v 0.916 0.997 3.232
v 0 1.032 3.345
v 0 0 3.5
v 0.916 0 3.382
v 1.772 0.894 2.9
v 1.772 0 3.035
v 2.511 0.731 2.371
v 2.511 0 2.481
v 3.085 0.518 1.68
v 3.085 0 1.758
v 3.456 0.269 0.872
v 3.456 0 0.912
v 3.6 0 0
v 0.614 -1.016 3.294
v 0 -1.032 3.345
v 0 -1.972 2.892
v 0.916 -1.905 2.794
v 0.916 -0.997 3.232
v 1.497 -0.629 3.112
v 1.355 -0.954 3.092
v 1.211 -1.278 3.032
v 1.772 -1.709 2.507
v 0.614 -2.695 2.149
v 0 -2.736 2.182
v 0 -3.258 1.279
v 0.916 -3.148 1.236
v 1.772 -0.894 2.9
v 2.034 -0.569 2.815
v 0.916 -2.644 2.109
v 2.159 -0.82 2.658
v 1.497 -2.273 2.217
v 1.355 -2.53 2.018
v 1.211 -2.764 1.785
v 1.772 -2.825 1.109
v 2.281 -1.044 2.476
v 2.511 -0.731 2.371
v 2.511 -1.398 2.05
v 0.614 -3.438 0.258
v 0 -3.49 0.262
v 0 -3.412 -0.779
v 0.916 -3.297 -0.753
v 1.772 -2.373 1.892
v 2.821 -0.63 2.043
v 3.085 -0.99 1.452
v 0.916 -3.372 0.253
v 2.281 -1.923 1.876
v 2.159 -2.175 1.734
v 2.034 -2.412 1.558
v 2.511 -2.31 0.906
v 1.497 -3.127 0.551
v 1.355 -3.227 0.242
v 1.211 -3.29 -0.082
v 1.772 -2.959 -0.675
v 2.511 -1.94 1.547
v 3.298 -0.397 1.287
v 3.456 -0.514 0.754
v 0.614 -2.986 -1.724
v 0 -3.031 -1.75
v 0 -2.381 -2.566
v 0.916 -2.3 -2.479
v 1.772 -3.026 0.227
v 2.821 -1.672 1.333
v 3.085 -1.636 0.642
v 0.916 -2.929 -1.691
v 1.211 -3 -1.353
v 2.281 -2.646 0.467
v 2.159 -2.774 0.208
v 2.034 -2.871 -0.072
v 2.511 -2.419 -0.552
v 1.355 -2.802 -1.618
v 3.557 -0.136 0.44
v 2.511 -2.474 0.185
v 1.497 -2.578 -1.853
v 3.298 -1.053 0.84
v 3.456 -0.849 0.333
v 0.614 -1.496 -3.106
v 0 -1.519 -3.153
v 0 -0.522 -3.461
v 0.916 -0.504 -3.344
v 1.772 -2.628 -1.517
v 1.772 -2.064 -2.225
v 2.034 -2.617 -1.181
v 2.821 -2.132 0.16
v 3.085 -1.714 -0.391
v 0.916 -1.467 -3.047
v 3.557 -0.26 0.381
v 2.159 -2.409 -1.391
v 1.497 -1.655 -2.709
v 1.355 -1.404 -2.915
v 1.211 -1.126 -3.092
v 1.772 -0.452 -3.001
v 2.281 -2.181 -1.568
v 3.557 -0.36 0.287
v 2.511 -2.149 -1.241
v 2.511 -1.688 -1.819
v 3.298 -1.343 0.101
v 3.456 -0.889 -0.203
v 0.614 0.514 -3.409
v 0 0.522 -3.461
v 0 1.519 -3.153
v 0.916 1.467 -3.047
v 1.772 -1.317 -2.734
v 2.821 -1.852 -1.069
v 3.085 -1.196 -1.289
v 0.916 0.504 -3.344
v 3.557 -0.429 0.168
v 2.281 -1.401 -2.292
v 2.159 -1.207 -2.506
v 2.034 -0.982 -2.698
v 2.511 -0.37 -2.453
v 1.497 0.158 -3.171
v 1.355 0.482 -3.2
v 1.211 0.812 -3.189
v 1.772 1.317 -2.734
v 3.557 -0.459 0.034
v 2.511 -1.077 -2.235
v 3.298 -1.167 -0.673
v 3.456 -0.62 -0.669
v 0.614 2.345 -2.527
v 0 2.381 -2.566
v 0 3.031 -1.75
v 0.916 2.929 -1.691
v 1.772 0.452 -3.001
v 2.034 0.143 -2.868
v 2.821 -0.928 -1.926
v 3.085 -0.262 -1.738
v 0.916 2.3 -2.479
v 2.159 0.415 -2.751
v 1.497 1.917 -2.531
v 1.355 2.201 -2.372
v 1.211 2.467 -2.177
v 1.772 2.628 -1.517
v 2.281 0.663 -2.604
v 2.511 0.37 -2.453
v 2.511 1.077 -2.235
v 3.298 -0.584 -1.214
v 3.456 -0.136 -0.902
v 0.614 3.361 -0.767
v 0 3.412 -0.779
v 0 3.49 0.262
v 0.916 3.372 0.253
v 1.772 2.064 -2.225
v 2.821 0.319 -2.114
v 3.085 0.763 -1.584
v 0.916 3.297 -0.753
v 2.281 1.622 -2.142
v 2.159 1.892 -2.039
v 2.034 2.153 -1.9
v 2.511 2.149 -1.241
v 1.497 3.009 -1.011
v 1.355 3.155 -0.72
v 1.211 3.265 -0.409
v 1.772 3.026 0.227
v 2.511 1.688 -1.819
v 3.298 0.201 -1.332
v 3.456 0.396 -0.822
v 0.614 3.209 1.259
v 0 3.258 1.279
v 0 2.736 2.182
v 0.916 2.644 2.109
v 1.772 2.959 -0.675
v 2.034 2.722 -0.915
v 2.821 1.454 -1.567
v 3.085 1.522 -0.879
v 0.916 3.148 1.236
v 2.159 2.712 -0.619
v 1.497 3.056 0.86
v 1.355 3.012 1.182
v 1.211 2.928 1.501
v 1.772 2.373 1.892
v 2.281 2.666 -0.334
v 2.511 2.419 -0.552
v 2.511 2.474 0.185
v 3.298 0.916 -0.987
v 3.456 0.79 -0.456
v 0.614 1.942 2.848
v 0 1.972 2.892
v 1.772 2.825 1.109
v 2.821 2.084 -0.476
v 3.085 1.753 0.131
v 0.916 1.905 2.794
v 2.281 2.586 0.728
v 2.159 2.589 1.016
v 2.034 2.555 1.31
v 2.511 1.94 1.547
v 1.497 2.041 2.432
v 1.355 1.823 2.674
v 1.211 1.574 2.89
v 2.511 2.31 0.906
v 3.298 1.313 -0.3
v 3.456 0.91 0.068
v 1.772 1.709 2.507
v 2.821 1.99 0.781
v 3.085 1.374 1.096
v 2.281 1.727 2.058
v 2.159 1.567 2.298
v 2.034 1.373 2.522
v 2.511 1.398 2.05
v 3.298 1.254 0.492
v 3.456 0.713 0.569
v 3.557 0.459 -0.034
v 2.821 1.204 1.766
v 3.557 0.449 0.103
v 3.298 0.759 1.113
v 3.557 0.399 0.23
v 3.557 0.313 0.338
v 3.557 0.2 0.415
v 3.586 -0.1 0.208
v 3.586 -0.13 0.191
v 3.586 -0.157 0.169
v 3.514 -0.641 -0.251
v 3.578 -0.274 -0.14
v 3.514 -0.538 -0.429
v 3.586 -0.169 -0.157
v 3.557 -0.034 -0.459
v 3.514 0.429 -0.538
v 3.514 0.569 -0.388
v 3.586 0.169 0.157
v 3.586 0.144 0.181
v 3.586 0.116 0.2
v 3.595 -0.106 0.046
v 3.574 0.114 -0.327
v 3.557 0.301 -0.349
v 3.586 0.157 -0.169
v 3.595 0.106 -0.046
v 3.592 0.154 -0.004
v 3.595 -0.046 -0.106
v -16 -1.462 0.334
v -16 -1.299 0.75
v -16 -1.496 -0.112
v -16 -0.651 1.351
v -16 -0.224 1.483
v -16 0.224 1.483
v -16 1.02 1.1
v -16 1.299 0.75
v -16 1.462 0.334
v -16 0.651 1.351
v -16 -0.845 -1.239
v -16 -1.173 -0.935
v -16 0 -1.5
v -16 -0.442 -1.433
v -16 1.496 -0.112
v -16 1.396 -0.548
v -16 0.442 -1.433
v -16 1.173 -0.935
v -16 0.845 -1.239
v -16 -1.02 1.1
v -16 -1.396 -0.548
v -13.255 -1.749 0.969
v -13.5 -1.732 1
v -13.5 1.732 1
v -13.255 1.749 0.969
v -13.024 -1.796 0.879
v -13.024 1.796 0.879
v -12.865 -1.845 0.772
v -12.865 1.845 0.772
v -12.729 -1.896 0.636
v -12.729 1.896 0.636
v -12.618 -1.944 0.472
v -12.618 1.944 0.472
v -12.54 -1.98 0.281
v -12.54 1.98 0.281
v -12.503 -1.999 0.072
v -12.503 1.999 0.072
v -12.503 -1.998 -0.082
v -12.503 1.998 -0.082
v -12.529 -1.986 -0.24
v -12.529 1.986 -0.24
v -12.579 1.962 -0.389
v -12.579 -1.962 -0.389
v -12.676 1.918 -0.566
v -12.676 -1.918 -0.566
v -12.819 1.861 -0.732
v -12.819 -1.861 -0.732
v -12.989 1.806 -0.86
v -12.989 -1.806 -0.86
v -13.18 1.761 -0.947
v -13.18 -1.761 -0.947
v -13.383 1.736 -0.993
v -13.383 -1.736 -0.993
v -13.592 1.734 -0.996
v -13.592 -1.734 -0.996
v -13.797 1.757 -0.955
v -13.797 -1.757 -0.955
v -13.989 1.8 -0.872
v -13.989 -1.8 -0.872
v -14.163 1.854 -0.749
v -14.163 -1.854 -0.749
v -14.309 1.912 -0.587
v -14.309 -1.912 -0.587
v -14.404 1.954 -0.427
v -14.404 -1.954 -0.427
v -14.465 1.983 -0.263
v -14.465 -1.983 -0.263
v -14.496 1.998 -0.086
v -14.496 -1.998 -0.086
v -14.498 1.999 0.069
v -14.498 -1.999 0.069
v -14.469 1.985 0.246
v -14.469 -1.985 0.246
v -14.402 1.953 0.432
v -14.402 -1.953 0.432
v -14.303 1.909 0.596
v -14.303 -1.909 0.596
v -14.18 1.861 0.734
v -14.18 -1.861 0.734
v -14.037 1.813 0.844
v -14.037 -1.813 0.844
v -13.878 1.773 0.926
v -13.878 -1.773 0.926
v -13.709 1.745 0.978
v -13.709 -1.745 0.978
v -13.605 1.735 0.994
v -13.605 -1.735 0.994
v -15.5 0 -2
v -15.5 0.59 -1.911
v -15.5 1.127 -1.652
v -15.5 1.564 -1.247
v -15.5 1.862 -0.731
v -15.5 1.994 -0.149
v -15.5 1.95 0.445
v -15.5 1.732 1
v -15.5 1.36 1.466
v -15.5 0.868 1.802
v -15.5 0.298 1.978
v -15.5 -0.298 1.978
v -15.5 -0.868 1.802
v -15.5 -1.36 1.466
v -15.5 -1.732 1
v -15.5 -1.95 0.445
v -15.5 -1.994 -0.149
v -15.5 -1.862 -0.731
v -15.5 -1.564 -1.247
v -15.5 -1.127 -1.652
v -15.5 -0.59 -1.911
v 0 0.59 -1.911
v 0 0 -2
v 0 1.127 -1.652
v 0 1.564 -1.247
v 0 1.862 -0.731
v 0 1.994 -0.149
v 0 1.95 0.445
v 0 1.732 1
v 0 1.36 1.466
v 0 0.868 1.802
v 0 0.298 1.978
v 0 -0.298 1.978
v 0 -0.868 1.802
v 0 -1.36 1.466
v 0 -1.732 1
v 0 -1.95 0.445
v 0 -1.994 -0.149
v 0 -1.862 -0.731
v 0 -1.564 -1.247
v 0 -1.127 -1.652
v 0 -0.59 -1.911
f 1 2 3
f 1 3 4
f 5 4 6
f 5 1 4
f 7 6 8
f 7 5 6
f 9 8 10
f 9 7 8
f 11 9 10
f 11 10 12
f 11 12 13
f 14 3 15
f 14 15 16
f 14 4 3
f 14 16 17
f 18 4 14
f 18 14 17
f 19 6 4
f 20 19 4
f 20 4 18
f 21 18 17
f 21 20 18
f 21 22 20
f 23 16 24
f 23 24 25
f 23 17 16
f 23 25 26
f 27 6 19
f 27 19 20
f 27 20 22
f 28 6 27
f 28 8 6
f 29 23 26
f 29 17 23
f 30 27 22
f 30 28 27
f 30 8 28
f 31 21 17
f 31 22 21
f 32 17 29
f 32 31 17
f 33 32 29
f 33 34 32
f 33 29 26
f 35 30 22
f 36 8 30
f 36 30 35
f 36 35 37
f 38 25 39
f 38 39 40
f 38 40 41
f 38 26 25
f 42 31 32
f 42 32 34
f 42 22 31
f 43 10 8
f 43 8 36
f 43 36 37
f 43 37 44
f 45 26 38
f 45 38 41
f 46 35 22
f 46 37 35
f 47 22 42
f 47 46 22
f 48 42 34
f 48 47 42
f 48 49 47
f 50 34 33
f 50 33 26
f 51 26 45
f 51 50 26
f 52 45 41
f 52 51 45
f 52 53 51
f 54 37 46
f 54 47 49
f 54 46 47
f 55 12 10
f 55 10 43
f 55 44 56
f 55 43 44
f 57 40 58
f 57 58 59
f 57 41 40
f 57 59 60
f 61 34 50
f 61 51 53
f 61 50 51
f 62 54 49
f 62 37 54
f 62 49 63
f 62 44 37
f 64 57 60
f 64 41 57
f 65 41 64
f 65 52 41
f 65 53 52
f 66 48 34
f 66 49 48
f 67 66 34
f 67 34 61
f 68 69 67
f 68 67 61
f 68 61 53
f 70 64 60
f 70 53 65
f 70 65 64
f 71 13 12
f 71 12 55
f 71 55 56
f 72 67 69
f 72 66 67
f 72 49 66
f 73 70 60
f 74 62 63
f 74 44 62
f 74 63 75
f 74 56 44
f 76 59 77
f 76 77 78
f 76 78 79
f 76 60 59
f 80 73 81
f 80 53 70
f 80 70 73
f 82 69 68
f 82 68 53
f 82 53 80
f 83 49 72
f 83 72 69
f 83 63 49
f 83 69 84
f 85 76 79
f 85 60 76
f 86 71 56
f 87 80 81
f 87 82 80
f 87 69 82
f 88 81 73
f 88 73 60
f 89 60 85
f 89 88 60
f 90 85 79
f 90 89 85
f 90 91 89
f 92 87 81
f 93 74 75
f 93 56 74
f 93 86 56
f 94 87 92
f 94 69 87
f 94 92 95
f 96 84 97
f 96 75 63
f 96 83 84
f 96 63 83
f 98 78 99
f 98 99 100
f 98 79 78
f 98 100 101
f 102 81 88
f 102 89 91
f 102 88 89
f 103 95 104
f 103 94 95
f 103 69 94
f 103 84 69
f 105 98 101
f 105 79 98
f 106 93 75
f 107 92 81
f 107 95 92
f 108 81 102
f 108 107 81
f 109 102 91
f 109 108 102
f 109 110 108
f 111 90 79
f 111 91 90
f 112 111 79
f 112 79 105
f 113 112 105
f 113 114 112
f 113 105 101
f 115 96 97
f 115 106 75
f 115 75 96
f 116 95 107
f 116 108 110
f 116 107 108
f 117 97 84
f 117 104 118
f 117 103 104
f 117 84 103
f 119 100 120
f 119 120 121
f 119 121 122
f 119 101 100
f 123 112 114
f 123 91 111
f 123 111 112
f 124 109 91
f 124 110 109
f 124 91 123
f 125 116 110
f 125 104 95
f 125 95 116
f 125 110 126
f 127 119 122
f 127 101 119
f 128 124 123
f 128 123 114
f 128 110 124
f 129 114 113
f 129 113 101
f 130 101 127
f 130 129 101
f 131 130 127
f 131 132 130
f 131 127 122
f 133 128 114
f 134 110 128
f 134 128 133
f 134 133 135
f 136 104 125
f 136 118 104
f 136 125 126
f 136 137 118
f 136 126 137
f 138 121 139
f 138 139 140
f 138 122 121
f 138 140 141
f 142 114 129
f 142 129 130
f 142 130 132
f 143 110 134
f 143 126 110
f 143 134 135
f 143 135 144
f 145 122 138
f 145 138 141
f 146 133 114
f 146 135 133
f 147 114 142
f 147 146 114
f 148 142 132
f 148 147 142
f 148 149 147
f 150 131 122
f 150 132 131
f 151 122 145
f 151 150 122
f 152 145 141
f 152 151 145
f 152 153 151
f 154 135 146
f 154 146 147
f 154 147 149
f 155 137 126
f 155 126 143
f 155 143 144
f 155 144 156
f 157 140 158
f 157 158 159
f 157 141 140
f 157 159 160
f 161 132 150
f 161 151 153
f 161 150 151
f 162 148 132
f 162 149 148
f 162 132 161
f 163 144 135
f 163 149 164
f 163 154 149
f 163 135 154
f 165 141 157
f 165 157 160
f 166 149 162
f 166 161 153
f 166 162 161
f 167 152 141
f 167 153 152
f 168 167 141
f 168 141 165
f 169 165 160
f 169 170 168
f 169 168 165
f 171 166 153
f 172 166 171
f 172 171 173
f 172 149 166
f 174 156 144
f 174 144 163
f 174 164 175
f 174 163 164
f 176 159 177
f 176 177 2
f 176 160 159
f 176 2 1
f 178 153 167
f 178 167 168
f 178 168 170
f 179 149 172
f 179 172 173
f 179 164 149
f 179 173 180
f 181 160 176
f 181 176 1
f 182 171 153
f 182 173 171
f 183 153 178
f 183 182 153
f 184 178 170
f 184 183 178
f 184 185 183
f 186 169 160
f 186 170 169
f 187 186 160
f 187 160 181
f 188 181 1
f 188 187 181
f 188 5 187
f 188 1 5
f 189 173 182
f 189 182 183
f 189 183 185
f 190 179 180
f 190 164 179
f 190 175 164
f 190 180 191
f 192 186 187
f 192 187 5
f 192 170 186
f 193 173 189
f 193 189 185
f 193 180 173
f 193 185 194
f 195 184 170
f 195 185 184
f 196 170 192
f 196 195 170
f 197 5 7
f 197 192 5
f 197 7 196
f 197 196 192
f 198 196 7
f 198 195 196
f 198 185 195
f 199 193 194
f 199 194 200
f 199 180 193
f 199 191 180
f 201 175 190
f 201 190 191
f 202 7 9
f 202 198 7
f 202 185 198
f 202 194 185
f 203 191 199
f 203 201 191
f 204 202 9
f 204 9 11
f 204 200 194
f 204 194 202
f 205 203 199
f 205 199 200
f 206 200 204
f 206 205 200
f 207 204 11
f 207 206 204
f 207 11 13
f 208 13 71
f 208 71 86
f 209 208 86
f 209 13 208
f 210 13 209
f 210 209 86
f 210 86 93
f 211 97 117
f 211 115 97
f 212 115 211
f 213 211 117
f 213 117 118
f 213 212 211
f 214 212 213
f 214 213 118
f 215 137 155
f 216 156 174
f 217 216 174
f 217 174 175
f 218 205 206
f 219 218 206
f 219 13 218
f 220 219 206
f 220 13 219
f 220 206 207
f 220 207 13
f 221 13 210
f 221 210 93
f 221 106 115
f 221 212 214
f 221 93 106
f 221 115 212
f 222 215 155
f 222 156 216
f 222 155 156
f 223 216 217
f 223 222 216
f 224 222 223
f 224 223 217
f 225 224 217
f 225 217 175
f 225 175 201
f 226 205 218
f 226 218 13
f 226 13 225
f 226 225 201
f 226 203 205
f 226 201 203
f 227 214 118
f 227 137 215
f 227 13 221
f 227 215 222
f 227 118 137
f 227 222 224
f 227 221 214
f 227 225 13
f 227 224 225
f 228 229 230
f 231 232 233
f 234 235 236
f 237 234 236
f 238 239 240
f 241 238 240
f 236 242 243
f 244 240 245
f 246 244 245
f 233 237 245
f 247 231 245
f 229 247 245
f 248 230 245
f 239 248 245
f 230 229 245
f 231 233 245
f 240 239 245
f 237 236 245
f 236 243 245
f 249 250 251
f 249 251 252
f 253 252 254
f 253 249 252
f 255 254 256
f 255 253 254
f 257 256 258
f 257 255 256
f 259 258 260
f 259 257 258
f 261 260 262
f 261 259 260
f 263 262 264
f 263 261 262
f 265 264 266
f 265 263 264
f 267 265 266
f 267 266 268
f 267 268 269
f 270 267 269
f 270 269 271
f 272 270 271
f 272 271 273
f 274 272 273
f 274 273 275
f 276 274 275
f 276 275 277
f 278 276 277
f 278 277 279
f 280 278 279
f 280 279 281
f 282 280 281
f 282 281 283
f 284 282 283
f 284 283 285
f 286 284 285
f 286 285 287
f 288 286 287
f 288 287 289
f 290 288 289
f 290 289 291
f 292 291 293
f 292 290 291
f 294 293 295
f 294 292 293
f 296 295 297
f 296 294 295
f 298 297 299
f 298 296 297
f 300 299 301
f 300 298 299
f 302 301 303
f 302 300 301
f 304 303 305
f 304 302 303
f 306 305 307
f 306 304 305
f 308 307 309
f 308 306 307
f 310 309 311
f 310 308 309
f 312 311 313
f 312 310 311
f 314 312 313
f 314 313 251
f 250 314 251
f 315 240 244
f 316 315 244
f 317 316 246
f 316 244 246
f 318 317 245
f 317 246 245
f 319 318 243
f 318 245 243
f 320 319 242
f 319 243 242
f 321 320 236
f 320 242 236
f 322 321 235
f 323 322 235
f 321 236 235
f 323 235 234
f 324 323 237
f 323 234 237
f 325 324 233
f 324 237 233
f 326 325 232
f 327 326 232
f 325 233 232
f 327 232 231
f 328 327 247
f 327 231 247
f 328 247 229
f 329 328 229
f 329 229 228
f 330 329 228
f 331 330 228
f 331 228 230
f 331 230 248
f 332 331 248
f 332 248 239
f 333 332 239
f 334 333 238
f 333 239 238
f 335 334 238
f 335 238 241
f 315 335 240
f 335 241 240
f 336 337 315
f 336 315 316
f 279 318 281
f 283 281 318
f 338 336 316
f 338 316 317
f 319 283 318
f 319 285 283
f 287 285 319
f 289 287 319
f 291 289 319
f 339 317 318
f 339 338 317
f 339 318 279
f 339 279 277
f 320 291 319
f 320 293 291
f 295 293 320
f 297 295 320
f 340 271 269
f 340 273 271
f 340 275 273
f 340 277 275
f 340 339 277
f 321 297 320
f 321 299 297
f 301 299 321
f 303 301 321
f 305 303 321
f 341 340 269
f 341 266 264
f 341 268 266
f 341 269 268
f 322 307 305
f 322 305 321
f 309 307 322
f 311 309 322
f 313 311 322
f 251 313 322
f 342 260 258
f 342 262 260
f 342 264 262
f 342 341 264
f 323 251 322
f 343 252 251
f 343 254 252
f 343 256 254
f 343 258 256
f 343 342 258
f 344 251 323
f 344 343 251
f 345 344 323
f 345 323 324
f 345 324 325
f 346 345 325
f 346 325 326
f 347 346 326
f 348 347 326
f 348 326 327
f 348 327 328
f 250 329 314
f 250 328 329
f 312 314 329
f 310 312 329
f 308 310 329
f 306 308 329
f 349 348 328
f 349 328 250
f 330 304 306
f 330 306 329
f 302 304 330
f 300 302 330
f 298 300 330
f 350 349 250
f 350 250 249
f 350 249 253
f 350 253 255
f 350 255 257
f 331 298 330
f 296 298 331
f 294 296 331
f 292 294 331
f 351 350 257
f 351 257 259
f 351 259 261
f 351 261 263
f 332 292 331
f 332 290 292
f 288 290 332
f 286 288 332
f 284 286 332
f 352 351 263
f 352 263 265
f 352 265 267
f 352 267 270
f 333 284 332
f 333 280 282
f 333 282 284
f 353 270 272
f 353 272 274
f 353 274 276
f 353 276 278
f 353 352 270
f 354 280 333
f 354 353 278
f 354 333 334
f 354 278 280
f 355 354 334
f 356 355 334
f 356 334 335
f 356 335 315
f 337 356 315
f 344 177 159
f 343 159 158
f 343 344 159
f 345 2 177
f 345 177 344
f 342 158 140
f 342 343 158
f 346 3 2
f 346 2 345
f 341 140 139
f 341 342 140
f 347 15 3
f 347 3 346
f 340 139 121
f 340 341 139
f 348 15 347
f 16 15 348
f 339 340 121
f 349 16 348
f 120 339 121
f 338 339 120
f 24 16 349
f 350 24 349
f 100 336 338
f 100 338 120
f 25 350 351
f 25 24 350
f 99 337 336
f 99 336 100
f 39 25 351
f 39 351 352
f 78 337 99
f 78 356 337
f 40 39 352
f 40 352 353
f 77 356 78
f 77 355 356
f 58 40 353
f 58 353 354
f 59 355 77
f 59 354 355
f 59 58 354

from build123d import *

# Parameters (mm, degrees)
SKETCH1_R               = 2
BOSS_EXTRUDE1_DEPTH     = 16
CUT_EXTRUDE1_DEPTH      = 17.248076809
CUT_EXTRUDE1_DEPTH_BACK = 17.248076809
SKETCH2_R               = 1
CHAMFER1_SIZE           = 0.5


with BuildPart() as part:
    # Sketch1 → Boss-Extrude1 (new body)
    with BuildSketch(Plane(origin=(0, 0, 0), x_dir=(0, 0, -1), z_dir=(1, 0, 0))):
        Circle(SKETCH1_R)
    extrude(amount=-BOSS_EXTRUDE1_DEPTH)

    # Sketch2 → Cut-Extrude1 (cut, two sides: drawn at the far end of the back side and taken through both)
    with BuildSketch(Plane(origin=(0, 0, 0), x_dir=(1, 0, 0), z_dir=(0, 1, 0)).offset(-CUT_EXTRUDE1_DEPTH_BACK)):
        with Locations(Location((-13.5, 0, 0), (0, 0, 270))):
            Circle(SKETCH2_R)
    extrude(amount=CUT_EXTRUDE1_DEPTH + CUT_EXTRUDE1_DEPTH_BACK, mode=Mode.SUBTRACT)

    # Sketch3 → Revolve1 (revolve)
    with BuildSketch(Plane(origin=(0, 0, 0), x_dir=(1, 0, 0), z_dir=(0, 1, 0))):
        with BuildLine():
            Line((0, 0), (0, -3.5))
            ThreePointArc((0, -3.5), (2.510871365, -2.481181976), (3.6, 0))
            Line((3.6, 0), (0, 0))
        make_face()
    revolve(axis=Axis((-3.287029336, 0, 0), (1, 0, 0)))

    # Chamfer1
    chamfer1_edges = [part.edges().sort_by_distance(p)[0] for p in [
        (-16, 0, 2),
    ]]
    chamfer(chamfer1_edges, length=CHAMFER1_SIZE)


solid = part.part
